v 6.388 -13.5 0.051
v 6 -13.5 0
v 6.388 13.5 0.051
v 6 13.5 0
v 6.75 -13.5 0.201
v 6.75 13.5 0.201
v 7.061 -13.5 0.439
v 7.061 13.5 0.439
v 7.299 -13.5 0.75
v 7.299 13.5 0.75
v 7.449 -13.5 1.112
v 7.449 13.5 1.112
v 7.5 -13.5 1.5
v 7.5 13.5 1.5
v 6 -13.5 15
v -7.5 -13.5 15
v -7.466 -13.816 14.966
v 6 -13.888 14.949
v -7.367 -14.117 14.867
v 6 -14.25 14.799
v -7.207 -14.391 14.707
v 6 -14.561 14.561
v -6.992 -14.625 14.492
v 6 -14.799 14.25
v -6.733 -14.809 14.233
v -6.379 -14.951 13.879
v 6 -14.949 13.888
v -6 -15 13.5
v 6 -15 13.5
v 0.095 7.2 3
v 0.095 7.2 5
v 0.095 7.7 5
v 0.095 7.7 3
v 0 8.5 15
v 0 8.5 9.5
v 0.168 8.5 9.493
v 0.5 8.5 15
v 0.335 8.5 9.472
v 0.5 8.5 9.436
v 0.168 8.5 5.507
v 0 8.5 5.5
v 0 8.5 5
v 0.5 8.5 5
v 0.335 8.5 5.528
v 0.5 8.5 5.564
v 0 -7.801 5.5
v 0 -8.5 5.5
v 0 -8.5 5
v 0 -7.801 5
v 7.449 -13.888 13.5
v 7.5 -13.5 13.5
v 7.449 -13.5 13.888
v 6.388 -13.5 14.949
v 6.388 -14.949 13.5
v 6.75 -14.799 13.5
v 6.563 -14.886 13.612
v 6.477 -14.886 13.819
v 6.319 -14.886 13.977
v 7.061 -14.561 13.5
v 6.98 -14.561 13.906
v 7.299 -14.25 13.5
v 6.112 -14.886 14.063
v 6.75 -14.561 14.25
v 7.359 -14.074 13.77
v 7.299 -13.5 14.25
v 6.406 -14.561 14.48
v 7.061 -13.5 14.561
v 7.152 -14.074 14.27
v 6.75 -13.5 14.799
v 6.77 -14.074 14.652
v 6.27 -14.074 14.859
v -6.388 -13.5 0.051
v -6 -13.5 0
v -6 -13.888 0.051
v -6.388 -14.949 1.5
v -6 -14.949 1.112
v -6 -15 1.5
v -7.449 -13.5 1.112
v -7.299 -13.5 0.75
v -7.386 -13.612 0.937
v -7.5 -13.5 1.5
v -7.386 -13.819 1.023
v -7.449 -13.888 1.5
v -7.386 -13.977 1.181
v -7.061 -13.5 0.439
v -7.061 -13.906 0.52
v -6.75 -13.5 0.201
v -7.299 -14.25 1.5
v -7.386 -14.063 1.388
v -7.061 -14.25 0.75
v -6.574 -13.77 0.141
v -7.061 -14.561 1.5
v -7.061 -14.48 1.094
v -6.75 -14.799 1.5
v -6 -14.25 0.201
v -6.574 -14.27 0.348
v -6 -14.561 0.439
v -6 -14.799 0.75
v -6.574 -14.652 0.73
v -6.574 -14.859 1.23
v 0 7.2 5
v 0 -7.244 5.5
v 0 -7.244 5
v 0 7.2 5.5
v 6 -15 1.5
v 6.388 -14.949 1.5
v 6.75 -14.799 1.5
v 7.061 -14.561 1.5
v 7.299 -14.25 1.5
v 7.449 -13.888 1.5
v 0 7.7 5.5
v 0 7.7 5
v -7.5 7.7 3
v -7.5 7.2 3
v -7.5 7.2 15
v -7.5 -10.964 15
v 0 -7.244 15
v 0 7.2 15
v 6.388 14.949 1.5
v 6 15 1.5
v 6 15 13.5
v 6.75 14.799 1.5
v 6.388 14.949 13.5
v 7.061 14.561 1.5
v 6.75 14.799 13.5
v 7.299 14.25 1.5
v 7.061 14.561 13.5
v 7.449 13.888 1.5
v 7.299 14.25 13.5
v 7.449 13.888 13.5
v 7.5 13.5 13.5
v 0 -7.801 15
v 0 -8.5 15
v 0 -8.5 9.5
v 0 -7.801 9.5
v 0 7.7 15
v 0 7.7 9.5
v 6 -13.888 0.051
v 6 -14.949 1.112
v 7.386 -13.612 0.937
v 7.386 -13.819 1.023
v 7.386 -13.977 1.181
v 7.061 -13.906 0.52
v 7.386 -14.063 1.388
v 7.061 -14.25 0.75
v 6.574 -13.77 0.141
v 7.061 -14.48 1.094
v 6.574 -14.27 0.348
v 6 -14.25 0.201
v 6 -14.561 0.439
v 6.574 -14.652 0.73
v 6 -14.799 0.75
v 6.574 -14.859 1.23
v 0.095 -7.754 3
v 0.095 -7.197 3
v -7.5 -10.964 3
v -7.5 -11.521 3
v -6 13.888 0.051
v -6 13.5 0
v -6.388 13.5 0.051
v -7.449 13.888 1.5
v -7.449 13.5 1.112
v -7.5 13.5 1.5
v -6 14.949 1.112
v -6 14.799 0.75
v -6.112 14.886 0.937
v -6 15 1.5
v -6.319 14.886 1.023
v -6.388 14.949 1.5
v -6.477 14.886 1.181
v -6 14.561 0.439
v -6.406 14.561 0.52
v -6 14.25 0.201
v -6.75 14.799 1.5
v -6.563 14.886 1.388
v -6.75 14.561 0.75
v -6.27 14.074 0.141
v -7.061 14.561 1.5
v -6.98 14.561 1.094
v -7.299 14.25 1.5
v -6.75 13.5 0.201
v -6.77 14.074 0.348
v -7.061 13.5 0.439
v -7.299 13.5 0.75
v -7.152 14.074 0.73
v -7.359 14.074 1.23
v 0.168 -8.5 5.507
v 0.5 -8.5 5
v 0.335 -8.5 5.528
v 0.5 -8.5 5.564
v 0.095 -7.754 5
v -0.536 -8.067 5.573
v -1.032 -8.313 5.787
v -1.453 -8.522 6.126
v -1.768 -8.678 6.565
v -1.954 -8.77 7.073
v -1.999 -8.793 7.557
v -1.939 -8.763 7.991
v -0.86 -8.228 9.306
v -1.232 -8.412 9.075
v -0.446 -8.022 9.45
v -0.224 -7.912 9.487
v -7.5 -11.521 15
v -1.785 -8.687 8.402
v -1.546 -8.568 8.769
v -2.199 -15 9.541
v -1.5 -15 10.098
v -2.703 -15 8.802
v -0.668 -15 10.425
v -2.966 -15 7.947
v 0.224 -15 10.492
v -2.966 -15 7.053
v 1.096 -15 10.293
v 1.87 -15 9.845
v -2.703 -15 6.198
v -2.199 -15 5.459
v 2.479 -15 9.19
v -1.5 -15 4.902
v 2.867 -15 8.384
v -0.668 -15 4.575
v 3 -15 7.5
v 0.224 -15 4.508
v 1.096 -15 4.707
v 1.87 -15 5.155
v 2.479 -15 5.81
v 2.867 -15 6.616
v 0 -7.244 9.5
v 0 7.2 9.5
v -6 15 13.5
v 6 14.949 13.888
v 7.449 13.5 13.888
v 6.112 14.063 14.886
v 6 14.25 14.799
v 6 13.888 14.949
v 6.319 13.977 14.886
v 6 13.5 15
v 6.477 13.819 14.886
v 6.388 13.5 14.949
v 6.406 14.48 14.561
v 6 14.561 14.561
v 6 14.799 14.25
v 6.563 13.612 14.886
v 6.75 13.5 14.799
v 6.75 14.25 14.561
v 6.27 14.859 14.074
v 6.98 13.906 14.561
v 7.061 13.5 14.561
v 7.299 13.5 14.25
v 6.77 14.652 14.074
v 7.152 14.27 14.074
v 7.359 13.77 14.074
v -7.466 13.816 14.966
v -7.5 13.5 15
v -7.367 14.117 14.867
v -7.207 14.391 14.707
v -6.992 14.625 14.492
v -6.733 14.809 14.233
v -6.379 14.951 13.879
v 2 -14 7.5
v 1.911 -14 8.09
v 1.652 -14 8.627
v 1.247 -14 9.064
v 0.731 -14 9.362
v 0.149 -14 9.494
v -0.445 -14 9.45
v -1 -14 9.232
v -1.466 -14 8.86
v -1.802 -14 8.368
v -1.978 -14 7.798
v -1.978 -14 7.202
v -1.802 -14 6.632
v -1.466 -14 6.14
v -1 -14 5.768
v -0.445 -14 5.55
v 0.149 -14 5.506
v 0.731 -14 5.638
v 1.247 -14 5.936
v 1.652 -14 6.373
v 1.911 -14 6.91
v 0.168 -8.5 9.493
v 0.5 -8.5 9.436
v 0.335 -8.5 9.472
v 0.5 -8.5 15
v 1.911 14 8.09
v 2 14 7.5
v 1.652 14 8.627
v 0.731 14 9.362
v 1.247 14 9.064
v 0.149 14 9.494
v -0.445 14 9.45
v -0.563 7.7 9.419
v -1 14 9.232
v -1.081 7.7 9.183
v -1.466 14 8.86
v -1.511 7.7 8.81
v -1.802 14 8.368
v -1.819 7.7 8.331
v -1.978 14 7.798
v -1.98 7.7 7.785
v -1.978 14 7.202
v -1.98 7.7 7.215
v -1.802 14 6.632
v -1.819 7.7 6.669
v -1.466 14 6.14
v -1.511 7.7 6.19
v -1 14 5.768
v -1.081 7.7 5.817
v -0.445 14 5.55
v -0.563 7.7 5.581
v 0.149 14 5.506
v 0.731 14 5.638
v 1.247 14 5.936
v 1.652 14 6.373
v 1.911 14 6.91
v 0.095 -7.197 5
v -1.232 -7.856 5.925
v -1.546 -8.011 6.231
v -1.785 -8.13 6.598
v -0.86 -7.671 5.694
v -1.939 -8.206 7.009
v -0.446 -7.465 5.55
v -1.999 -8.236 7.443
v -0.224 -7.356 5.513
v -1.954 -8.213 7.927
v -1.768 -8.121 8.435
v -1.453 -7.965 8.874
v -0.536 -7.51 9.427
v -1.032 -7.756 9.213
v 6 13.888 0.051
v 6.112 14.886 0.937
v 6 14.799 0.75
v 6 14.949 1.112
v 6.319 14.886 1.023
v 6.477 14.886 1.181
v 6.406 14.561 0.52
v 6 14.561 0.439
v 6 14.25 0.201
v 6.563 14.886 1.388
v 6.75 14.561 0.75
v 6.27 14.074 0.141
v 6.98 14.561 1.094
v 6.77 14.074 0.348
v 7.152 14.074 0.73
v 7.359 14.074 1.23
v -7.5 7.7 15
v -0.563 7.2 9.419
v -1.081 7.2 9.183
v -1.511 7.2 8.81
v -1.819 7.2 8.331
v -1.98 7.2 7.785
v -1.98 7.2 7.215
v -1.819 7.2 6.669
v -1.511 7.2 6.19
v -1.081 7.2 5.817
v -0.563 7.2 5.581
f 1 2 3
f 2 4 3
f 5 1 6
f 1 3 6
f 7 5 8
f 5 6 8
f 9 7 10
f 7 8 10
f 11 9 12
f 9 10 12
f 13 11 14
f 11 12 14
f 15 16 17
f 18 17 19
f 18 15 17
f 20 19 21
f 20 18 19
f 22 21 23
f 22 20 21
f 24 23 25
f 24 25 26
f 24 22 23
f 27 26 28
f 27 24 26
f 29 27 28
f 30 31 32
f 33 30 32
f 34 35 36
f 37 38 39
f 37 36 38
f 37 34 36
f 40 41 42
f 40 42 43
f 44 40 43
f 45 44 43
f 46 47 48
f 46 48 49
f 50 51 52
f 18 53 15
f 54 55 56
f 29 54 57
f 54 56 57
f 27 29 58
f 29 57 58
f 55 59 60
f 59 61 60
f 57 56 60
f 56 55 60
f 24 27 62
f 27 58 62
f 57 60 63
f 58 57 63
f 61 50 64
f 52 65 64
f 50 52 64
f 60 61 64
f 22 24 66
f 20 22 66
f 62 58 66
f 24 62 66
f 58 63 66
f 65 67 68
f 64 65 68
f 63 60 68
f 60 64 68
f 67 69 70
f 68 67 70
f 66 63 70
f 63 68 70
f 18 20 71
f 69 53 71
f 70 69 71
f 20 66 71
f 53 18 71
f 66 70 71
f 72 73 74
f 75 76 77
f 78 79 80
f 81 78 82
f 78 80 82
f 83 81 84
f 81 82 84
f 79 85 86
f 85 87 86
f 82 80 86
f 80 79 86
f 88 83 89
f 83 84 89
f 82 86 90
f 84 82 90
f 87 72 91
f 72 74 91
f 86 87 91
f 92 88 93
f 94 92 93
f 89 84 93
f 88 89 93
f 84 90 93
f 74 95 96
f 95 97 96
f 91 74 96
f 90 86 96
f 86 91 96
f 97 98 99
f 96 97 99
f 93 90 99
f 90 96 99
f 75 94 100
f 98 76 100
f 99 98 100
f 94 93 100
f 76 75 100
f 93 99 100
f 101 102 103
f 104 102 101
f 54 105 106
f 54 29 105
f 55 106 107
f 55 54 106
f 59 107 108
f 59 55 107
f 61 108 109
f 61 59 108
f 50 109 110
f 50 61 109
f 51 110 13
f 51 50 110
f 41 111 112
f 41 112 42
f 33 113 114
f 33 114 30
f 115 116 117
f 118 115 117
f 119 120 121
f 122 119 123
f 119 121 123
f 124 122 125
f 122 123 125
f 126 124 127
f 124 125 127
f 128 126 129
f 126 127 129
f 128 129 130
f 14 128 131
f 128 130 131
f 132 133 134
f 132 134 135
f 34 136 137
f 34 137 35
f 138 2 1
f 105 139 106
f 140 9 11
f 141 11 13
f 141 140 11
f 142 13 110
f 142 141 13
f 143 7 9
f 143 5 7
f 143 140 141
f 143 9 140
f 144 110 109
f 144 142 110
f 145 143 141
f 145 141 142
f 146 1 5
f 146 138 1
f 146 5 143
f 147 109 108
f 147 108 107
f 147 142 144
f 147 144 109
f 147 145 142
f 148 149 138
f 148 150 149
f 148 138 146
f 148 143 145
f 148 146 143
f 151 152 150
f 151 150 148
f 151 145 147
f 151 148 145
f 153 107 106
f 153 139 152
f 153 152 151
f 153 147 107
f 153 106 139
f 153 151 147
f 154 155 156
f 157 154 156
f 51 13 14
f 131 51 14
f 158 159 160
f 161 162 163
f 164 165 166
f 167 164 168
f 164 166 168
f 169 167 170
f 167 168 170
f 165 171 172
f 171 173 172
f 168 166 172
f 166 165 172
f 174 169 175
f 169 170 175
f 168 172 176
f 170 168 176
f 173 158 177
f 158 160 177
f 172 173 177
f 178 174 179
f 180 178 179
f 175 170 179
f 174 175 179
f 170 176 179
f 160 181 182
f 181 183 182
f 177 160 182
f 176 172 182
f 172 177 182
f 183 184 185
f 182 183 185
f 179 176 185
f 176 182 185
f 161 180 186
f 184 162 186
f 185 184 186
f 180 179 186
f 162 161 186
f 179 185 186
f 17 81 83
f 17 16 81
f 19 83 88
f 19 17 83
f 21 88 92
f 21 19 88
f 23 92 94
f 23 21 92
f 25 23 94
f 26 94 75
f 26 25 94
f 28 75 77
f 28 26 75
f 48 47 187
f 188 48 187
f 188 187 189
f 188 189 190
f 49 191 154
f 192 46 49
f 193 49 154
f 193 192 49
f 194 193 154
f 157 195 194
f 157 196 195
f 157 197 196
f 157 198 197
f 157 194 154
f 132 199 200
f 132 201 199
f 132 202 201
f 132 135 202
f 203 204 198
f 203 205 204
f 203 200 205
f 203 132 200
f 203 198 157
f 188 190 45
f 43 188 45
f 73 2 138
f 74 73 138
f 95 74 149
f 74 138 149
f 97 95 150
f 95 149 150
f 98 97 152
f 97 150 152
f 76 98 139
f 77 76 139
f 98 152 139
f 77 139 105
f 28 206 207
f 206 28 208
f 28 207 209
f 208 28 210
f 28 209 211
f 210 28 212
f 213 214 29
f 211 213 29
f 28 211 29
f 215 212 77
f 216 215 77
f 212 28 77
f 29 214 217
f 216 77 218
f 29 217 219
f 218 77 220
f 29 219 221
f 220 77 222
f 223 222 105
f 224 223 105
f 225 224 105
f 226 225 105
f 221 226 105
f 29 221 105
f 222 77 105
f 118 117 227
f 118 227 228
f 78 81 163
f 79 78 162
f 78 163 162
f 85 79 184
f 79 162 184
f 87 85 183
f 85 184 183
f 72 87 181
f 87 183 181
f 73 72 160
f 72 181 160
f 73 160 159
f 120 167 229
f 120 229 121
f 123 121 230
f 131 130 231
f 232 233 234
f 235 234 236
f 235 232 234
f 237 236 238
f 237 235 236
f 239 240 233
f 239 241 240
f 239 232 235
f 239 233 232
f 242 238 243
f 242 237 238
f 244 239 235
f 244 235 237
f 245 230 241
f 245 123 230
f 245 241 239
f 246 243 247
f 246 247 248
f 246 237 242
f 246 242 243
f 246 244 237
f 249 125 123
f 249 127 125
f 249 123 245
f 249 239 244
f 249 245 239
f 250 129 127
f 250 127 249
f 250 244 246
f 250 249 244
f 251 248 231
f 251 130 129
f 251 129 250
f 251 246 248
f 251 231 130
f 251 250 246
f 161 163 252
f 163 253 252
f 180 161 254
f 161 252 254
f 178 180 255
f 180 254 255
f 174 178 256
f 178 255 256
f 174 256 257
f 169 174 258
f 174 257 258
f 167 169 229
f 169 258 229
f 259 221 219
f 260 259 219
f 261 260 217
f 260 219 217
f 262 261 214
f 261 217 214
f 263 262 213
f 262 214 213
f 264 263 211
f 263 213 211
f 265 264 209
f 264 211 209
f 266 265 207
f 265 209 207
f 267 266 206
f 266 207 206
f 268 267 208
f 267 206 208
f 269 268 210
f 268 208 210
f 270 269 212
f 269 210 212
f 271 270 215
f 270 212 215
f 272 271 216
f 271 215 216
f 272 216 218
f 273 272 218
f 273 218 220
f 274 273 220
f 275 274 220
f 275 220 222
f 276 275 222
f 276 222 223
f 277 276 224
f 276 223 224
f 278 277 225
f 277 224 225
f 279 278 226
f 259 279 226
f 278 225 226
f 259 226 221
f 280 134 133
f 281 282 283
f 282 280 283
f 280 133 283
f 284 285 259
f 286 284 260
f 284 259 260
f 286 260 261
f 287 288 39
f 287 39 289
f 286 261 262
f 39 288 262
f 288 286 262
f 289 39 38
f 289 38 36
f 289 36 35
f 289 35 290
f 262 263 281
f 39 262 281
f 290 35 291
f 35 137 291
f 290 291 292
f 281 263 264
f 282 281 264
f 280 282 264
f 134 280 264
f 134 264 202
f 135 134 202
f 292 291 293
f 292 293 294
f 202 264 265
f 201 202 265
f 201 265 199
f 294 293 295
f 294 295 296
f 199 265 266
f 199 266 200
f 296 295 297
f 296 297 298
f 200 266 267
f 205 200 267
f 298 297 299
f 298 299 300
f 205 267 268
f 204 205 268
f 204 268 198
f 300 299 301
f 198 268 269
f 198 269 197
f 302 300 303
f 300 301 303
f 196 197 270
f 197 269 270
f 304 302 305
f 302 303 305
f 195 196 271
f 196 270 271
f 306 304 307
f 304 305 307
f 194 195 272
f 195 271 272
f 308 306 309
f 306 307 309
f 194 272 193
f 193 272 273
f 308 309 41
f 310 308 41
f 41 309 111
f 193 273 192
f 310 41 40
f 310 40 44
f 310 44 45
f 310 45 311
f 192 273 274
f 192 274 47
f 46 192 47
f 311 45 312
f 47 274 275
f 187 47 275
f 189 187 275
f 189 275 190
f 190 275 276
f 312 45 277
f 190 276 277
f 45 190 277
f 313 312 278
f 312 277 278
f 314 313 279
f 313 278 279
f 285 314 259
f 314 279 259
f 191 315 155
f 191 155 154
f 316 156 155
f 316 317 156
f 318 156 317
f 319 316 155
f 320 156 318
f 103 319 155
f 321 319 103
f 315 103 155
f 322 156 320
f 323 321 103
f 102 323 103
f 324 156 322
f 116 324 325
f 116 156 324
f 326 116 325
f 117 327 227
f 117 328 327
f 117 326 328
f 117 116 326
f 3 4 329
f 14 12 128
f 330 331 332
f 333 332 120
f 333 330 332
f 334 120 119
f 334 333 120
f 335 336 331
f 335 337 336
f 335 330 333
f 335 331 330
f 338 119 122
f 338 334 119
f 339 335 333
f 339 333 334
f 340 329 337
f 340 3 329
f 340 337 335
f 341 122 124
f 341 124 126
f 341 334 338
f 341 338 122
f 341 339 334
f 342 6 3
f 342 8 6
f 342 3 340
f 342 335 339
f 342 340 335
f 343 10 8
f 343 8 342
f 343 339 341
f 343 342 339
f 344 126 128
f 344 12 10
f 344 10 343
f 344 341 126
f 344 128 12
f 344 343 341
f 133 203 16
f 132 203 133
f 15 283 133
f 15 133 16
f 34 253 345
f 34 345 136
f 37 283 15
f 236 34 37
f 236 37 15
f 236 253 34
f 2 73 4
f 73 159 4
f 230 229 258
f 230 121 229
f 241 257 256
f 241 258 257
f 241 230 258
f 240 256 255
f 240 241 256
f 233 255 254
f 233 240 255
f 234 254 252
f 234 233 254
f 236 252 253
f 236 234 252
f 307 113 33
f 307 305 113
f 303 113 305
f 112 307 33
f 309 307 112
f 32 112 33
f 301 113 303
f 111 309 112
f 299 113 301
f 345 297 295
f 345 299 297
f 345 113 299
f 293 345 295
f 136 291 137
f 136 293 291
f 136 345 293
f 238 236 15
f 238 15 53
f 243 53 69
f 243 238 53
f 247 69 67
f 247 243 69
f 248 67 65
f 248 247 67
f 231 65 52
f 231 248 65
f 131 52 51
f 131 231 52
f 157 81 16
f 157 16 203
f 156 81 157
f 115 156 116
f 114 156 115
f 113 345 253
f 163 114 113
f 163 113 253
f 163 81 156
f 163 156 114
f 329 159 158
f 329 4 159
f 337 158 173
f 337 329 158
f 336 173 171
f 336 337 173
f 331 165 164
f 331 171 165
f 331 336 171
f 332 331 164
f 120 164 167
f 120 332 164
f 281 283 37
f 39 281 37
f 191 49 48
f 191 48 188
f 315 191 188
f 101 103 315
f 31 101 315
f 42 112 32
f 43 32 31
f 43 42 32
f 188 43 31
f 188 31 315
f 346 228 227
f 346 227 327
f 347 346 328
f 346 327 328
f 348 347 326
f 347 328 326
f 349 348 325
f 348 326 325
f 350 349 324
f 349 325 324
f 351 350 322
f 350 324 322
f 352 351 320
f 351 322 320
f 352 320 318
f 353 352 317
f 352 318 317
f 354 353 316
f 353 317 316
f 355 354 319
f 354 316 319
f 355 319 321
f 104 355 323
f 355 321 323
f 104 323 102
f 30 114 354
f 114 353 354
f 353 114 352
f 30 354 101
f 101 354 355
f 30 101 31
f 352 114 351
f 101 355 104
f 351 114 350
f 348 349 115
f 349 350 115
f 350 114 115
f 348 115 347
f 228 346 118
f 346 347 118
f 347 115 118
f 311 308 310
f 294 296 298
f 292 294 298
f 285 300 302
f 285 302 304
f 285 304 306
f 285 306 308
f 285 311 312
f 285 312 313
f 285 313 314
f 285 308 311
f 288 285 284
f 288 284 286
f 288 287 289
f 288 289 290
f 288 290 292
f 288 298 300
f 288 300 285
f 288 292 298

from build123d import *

# Parameters (mm, degrees)
SKETCH027_W     = 15
SKETCH027_H     = 30
PAD008_DEPTH    = 15
SKETCH028_R     = 2
POCKET019_DEPTH = 29
SKETCH029_W     = 0.5
SKETCH029_H     = 17
POCKET020_DEPTH = 10
SKETCH030_W     = 7.783355
SKETCH030_H     = 0.5
POCKET021_DEPTH = 12
FILLET010_R     = 1.5
CHAMFER005_SIZE = 1


with BuildPart() as part:
    # Sketch027 → Pad008 (new body)
    with BuildSketch(Plane.XY):
        Rectangle(SKETCH027_W, SKETCH027_H)
    extrude(amount=PAD008_DEPTH)

    # Sketch028 (on Face3 of Pad008) → Pocket019 (cut)
    with BuildSketch(Plane.XZ.offset(15)):
        with Locations((0, 7.5)):
            Circle(SKETCH028_R)
    extrude(amount=-POCKET019_DEPTH, mode=Mode.SUBTRACT)

    # Sketch029 (on Face5 of Pocket019) → Pocket020 (cut)
    with BuildSketch(Plane.XY.offset(15)):
        with Locations((0.25, 0)):
            Rectangle(SKETCH029_W, SKETCH029_H)
    extrude(amount=-POCKET020_DEPTH, mode=Mode.SUBTRACT)

    # Sketch030 (on Face5 of Pocket020) → Pocket021 (cut)
    with BuildSketch(Plane.XY.offset(15)):
        Polygon((0.095277, -7.753875), (-7.818323, -11.679128), (-7.818323, -11.122255), (0.095277, -7.197002), align=None)
        with Locations((-3.7964, 7.45)):
            Rectangle(SKETCH030_W, SKETCH030_H)
    extrude(amount=-POCKET021_DEPTH, mode=Mode.SUBTRACT)

    # Fillet010
    fillet010_edges = [part.edges().sort_by_distance(p)[0] for p in [
        (0, -15, 0),
        (-7.5, 0, 0),
        (7.5, 0, 0),
        (0, 15, 0),
        (7.5, 15, 7.5),
        (-7.5, 15, 7.5),
        (0, 15, 15),
        (7.5, 0, 15),
        (7.5, -15, 7.5),
        (0, -15, 15),
        (-7.5, -15, 7.5),
    ]]
    fillet(fillet010_edges, radius=FILLET010_R)

    # Chamfer005
    chamfer005_edges = [part.edges().sort_by_distance(p)[0] for p in [
        (-2, -15, 7.5),
    ]]
    chamfer(chamfer005_edges, length=CHAMFER005_SIZE)


solid = part.part
